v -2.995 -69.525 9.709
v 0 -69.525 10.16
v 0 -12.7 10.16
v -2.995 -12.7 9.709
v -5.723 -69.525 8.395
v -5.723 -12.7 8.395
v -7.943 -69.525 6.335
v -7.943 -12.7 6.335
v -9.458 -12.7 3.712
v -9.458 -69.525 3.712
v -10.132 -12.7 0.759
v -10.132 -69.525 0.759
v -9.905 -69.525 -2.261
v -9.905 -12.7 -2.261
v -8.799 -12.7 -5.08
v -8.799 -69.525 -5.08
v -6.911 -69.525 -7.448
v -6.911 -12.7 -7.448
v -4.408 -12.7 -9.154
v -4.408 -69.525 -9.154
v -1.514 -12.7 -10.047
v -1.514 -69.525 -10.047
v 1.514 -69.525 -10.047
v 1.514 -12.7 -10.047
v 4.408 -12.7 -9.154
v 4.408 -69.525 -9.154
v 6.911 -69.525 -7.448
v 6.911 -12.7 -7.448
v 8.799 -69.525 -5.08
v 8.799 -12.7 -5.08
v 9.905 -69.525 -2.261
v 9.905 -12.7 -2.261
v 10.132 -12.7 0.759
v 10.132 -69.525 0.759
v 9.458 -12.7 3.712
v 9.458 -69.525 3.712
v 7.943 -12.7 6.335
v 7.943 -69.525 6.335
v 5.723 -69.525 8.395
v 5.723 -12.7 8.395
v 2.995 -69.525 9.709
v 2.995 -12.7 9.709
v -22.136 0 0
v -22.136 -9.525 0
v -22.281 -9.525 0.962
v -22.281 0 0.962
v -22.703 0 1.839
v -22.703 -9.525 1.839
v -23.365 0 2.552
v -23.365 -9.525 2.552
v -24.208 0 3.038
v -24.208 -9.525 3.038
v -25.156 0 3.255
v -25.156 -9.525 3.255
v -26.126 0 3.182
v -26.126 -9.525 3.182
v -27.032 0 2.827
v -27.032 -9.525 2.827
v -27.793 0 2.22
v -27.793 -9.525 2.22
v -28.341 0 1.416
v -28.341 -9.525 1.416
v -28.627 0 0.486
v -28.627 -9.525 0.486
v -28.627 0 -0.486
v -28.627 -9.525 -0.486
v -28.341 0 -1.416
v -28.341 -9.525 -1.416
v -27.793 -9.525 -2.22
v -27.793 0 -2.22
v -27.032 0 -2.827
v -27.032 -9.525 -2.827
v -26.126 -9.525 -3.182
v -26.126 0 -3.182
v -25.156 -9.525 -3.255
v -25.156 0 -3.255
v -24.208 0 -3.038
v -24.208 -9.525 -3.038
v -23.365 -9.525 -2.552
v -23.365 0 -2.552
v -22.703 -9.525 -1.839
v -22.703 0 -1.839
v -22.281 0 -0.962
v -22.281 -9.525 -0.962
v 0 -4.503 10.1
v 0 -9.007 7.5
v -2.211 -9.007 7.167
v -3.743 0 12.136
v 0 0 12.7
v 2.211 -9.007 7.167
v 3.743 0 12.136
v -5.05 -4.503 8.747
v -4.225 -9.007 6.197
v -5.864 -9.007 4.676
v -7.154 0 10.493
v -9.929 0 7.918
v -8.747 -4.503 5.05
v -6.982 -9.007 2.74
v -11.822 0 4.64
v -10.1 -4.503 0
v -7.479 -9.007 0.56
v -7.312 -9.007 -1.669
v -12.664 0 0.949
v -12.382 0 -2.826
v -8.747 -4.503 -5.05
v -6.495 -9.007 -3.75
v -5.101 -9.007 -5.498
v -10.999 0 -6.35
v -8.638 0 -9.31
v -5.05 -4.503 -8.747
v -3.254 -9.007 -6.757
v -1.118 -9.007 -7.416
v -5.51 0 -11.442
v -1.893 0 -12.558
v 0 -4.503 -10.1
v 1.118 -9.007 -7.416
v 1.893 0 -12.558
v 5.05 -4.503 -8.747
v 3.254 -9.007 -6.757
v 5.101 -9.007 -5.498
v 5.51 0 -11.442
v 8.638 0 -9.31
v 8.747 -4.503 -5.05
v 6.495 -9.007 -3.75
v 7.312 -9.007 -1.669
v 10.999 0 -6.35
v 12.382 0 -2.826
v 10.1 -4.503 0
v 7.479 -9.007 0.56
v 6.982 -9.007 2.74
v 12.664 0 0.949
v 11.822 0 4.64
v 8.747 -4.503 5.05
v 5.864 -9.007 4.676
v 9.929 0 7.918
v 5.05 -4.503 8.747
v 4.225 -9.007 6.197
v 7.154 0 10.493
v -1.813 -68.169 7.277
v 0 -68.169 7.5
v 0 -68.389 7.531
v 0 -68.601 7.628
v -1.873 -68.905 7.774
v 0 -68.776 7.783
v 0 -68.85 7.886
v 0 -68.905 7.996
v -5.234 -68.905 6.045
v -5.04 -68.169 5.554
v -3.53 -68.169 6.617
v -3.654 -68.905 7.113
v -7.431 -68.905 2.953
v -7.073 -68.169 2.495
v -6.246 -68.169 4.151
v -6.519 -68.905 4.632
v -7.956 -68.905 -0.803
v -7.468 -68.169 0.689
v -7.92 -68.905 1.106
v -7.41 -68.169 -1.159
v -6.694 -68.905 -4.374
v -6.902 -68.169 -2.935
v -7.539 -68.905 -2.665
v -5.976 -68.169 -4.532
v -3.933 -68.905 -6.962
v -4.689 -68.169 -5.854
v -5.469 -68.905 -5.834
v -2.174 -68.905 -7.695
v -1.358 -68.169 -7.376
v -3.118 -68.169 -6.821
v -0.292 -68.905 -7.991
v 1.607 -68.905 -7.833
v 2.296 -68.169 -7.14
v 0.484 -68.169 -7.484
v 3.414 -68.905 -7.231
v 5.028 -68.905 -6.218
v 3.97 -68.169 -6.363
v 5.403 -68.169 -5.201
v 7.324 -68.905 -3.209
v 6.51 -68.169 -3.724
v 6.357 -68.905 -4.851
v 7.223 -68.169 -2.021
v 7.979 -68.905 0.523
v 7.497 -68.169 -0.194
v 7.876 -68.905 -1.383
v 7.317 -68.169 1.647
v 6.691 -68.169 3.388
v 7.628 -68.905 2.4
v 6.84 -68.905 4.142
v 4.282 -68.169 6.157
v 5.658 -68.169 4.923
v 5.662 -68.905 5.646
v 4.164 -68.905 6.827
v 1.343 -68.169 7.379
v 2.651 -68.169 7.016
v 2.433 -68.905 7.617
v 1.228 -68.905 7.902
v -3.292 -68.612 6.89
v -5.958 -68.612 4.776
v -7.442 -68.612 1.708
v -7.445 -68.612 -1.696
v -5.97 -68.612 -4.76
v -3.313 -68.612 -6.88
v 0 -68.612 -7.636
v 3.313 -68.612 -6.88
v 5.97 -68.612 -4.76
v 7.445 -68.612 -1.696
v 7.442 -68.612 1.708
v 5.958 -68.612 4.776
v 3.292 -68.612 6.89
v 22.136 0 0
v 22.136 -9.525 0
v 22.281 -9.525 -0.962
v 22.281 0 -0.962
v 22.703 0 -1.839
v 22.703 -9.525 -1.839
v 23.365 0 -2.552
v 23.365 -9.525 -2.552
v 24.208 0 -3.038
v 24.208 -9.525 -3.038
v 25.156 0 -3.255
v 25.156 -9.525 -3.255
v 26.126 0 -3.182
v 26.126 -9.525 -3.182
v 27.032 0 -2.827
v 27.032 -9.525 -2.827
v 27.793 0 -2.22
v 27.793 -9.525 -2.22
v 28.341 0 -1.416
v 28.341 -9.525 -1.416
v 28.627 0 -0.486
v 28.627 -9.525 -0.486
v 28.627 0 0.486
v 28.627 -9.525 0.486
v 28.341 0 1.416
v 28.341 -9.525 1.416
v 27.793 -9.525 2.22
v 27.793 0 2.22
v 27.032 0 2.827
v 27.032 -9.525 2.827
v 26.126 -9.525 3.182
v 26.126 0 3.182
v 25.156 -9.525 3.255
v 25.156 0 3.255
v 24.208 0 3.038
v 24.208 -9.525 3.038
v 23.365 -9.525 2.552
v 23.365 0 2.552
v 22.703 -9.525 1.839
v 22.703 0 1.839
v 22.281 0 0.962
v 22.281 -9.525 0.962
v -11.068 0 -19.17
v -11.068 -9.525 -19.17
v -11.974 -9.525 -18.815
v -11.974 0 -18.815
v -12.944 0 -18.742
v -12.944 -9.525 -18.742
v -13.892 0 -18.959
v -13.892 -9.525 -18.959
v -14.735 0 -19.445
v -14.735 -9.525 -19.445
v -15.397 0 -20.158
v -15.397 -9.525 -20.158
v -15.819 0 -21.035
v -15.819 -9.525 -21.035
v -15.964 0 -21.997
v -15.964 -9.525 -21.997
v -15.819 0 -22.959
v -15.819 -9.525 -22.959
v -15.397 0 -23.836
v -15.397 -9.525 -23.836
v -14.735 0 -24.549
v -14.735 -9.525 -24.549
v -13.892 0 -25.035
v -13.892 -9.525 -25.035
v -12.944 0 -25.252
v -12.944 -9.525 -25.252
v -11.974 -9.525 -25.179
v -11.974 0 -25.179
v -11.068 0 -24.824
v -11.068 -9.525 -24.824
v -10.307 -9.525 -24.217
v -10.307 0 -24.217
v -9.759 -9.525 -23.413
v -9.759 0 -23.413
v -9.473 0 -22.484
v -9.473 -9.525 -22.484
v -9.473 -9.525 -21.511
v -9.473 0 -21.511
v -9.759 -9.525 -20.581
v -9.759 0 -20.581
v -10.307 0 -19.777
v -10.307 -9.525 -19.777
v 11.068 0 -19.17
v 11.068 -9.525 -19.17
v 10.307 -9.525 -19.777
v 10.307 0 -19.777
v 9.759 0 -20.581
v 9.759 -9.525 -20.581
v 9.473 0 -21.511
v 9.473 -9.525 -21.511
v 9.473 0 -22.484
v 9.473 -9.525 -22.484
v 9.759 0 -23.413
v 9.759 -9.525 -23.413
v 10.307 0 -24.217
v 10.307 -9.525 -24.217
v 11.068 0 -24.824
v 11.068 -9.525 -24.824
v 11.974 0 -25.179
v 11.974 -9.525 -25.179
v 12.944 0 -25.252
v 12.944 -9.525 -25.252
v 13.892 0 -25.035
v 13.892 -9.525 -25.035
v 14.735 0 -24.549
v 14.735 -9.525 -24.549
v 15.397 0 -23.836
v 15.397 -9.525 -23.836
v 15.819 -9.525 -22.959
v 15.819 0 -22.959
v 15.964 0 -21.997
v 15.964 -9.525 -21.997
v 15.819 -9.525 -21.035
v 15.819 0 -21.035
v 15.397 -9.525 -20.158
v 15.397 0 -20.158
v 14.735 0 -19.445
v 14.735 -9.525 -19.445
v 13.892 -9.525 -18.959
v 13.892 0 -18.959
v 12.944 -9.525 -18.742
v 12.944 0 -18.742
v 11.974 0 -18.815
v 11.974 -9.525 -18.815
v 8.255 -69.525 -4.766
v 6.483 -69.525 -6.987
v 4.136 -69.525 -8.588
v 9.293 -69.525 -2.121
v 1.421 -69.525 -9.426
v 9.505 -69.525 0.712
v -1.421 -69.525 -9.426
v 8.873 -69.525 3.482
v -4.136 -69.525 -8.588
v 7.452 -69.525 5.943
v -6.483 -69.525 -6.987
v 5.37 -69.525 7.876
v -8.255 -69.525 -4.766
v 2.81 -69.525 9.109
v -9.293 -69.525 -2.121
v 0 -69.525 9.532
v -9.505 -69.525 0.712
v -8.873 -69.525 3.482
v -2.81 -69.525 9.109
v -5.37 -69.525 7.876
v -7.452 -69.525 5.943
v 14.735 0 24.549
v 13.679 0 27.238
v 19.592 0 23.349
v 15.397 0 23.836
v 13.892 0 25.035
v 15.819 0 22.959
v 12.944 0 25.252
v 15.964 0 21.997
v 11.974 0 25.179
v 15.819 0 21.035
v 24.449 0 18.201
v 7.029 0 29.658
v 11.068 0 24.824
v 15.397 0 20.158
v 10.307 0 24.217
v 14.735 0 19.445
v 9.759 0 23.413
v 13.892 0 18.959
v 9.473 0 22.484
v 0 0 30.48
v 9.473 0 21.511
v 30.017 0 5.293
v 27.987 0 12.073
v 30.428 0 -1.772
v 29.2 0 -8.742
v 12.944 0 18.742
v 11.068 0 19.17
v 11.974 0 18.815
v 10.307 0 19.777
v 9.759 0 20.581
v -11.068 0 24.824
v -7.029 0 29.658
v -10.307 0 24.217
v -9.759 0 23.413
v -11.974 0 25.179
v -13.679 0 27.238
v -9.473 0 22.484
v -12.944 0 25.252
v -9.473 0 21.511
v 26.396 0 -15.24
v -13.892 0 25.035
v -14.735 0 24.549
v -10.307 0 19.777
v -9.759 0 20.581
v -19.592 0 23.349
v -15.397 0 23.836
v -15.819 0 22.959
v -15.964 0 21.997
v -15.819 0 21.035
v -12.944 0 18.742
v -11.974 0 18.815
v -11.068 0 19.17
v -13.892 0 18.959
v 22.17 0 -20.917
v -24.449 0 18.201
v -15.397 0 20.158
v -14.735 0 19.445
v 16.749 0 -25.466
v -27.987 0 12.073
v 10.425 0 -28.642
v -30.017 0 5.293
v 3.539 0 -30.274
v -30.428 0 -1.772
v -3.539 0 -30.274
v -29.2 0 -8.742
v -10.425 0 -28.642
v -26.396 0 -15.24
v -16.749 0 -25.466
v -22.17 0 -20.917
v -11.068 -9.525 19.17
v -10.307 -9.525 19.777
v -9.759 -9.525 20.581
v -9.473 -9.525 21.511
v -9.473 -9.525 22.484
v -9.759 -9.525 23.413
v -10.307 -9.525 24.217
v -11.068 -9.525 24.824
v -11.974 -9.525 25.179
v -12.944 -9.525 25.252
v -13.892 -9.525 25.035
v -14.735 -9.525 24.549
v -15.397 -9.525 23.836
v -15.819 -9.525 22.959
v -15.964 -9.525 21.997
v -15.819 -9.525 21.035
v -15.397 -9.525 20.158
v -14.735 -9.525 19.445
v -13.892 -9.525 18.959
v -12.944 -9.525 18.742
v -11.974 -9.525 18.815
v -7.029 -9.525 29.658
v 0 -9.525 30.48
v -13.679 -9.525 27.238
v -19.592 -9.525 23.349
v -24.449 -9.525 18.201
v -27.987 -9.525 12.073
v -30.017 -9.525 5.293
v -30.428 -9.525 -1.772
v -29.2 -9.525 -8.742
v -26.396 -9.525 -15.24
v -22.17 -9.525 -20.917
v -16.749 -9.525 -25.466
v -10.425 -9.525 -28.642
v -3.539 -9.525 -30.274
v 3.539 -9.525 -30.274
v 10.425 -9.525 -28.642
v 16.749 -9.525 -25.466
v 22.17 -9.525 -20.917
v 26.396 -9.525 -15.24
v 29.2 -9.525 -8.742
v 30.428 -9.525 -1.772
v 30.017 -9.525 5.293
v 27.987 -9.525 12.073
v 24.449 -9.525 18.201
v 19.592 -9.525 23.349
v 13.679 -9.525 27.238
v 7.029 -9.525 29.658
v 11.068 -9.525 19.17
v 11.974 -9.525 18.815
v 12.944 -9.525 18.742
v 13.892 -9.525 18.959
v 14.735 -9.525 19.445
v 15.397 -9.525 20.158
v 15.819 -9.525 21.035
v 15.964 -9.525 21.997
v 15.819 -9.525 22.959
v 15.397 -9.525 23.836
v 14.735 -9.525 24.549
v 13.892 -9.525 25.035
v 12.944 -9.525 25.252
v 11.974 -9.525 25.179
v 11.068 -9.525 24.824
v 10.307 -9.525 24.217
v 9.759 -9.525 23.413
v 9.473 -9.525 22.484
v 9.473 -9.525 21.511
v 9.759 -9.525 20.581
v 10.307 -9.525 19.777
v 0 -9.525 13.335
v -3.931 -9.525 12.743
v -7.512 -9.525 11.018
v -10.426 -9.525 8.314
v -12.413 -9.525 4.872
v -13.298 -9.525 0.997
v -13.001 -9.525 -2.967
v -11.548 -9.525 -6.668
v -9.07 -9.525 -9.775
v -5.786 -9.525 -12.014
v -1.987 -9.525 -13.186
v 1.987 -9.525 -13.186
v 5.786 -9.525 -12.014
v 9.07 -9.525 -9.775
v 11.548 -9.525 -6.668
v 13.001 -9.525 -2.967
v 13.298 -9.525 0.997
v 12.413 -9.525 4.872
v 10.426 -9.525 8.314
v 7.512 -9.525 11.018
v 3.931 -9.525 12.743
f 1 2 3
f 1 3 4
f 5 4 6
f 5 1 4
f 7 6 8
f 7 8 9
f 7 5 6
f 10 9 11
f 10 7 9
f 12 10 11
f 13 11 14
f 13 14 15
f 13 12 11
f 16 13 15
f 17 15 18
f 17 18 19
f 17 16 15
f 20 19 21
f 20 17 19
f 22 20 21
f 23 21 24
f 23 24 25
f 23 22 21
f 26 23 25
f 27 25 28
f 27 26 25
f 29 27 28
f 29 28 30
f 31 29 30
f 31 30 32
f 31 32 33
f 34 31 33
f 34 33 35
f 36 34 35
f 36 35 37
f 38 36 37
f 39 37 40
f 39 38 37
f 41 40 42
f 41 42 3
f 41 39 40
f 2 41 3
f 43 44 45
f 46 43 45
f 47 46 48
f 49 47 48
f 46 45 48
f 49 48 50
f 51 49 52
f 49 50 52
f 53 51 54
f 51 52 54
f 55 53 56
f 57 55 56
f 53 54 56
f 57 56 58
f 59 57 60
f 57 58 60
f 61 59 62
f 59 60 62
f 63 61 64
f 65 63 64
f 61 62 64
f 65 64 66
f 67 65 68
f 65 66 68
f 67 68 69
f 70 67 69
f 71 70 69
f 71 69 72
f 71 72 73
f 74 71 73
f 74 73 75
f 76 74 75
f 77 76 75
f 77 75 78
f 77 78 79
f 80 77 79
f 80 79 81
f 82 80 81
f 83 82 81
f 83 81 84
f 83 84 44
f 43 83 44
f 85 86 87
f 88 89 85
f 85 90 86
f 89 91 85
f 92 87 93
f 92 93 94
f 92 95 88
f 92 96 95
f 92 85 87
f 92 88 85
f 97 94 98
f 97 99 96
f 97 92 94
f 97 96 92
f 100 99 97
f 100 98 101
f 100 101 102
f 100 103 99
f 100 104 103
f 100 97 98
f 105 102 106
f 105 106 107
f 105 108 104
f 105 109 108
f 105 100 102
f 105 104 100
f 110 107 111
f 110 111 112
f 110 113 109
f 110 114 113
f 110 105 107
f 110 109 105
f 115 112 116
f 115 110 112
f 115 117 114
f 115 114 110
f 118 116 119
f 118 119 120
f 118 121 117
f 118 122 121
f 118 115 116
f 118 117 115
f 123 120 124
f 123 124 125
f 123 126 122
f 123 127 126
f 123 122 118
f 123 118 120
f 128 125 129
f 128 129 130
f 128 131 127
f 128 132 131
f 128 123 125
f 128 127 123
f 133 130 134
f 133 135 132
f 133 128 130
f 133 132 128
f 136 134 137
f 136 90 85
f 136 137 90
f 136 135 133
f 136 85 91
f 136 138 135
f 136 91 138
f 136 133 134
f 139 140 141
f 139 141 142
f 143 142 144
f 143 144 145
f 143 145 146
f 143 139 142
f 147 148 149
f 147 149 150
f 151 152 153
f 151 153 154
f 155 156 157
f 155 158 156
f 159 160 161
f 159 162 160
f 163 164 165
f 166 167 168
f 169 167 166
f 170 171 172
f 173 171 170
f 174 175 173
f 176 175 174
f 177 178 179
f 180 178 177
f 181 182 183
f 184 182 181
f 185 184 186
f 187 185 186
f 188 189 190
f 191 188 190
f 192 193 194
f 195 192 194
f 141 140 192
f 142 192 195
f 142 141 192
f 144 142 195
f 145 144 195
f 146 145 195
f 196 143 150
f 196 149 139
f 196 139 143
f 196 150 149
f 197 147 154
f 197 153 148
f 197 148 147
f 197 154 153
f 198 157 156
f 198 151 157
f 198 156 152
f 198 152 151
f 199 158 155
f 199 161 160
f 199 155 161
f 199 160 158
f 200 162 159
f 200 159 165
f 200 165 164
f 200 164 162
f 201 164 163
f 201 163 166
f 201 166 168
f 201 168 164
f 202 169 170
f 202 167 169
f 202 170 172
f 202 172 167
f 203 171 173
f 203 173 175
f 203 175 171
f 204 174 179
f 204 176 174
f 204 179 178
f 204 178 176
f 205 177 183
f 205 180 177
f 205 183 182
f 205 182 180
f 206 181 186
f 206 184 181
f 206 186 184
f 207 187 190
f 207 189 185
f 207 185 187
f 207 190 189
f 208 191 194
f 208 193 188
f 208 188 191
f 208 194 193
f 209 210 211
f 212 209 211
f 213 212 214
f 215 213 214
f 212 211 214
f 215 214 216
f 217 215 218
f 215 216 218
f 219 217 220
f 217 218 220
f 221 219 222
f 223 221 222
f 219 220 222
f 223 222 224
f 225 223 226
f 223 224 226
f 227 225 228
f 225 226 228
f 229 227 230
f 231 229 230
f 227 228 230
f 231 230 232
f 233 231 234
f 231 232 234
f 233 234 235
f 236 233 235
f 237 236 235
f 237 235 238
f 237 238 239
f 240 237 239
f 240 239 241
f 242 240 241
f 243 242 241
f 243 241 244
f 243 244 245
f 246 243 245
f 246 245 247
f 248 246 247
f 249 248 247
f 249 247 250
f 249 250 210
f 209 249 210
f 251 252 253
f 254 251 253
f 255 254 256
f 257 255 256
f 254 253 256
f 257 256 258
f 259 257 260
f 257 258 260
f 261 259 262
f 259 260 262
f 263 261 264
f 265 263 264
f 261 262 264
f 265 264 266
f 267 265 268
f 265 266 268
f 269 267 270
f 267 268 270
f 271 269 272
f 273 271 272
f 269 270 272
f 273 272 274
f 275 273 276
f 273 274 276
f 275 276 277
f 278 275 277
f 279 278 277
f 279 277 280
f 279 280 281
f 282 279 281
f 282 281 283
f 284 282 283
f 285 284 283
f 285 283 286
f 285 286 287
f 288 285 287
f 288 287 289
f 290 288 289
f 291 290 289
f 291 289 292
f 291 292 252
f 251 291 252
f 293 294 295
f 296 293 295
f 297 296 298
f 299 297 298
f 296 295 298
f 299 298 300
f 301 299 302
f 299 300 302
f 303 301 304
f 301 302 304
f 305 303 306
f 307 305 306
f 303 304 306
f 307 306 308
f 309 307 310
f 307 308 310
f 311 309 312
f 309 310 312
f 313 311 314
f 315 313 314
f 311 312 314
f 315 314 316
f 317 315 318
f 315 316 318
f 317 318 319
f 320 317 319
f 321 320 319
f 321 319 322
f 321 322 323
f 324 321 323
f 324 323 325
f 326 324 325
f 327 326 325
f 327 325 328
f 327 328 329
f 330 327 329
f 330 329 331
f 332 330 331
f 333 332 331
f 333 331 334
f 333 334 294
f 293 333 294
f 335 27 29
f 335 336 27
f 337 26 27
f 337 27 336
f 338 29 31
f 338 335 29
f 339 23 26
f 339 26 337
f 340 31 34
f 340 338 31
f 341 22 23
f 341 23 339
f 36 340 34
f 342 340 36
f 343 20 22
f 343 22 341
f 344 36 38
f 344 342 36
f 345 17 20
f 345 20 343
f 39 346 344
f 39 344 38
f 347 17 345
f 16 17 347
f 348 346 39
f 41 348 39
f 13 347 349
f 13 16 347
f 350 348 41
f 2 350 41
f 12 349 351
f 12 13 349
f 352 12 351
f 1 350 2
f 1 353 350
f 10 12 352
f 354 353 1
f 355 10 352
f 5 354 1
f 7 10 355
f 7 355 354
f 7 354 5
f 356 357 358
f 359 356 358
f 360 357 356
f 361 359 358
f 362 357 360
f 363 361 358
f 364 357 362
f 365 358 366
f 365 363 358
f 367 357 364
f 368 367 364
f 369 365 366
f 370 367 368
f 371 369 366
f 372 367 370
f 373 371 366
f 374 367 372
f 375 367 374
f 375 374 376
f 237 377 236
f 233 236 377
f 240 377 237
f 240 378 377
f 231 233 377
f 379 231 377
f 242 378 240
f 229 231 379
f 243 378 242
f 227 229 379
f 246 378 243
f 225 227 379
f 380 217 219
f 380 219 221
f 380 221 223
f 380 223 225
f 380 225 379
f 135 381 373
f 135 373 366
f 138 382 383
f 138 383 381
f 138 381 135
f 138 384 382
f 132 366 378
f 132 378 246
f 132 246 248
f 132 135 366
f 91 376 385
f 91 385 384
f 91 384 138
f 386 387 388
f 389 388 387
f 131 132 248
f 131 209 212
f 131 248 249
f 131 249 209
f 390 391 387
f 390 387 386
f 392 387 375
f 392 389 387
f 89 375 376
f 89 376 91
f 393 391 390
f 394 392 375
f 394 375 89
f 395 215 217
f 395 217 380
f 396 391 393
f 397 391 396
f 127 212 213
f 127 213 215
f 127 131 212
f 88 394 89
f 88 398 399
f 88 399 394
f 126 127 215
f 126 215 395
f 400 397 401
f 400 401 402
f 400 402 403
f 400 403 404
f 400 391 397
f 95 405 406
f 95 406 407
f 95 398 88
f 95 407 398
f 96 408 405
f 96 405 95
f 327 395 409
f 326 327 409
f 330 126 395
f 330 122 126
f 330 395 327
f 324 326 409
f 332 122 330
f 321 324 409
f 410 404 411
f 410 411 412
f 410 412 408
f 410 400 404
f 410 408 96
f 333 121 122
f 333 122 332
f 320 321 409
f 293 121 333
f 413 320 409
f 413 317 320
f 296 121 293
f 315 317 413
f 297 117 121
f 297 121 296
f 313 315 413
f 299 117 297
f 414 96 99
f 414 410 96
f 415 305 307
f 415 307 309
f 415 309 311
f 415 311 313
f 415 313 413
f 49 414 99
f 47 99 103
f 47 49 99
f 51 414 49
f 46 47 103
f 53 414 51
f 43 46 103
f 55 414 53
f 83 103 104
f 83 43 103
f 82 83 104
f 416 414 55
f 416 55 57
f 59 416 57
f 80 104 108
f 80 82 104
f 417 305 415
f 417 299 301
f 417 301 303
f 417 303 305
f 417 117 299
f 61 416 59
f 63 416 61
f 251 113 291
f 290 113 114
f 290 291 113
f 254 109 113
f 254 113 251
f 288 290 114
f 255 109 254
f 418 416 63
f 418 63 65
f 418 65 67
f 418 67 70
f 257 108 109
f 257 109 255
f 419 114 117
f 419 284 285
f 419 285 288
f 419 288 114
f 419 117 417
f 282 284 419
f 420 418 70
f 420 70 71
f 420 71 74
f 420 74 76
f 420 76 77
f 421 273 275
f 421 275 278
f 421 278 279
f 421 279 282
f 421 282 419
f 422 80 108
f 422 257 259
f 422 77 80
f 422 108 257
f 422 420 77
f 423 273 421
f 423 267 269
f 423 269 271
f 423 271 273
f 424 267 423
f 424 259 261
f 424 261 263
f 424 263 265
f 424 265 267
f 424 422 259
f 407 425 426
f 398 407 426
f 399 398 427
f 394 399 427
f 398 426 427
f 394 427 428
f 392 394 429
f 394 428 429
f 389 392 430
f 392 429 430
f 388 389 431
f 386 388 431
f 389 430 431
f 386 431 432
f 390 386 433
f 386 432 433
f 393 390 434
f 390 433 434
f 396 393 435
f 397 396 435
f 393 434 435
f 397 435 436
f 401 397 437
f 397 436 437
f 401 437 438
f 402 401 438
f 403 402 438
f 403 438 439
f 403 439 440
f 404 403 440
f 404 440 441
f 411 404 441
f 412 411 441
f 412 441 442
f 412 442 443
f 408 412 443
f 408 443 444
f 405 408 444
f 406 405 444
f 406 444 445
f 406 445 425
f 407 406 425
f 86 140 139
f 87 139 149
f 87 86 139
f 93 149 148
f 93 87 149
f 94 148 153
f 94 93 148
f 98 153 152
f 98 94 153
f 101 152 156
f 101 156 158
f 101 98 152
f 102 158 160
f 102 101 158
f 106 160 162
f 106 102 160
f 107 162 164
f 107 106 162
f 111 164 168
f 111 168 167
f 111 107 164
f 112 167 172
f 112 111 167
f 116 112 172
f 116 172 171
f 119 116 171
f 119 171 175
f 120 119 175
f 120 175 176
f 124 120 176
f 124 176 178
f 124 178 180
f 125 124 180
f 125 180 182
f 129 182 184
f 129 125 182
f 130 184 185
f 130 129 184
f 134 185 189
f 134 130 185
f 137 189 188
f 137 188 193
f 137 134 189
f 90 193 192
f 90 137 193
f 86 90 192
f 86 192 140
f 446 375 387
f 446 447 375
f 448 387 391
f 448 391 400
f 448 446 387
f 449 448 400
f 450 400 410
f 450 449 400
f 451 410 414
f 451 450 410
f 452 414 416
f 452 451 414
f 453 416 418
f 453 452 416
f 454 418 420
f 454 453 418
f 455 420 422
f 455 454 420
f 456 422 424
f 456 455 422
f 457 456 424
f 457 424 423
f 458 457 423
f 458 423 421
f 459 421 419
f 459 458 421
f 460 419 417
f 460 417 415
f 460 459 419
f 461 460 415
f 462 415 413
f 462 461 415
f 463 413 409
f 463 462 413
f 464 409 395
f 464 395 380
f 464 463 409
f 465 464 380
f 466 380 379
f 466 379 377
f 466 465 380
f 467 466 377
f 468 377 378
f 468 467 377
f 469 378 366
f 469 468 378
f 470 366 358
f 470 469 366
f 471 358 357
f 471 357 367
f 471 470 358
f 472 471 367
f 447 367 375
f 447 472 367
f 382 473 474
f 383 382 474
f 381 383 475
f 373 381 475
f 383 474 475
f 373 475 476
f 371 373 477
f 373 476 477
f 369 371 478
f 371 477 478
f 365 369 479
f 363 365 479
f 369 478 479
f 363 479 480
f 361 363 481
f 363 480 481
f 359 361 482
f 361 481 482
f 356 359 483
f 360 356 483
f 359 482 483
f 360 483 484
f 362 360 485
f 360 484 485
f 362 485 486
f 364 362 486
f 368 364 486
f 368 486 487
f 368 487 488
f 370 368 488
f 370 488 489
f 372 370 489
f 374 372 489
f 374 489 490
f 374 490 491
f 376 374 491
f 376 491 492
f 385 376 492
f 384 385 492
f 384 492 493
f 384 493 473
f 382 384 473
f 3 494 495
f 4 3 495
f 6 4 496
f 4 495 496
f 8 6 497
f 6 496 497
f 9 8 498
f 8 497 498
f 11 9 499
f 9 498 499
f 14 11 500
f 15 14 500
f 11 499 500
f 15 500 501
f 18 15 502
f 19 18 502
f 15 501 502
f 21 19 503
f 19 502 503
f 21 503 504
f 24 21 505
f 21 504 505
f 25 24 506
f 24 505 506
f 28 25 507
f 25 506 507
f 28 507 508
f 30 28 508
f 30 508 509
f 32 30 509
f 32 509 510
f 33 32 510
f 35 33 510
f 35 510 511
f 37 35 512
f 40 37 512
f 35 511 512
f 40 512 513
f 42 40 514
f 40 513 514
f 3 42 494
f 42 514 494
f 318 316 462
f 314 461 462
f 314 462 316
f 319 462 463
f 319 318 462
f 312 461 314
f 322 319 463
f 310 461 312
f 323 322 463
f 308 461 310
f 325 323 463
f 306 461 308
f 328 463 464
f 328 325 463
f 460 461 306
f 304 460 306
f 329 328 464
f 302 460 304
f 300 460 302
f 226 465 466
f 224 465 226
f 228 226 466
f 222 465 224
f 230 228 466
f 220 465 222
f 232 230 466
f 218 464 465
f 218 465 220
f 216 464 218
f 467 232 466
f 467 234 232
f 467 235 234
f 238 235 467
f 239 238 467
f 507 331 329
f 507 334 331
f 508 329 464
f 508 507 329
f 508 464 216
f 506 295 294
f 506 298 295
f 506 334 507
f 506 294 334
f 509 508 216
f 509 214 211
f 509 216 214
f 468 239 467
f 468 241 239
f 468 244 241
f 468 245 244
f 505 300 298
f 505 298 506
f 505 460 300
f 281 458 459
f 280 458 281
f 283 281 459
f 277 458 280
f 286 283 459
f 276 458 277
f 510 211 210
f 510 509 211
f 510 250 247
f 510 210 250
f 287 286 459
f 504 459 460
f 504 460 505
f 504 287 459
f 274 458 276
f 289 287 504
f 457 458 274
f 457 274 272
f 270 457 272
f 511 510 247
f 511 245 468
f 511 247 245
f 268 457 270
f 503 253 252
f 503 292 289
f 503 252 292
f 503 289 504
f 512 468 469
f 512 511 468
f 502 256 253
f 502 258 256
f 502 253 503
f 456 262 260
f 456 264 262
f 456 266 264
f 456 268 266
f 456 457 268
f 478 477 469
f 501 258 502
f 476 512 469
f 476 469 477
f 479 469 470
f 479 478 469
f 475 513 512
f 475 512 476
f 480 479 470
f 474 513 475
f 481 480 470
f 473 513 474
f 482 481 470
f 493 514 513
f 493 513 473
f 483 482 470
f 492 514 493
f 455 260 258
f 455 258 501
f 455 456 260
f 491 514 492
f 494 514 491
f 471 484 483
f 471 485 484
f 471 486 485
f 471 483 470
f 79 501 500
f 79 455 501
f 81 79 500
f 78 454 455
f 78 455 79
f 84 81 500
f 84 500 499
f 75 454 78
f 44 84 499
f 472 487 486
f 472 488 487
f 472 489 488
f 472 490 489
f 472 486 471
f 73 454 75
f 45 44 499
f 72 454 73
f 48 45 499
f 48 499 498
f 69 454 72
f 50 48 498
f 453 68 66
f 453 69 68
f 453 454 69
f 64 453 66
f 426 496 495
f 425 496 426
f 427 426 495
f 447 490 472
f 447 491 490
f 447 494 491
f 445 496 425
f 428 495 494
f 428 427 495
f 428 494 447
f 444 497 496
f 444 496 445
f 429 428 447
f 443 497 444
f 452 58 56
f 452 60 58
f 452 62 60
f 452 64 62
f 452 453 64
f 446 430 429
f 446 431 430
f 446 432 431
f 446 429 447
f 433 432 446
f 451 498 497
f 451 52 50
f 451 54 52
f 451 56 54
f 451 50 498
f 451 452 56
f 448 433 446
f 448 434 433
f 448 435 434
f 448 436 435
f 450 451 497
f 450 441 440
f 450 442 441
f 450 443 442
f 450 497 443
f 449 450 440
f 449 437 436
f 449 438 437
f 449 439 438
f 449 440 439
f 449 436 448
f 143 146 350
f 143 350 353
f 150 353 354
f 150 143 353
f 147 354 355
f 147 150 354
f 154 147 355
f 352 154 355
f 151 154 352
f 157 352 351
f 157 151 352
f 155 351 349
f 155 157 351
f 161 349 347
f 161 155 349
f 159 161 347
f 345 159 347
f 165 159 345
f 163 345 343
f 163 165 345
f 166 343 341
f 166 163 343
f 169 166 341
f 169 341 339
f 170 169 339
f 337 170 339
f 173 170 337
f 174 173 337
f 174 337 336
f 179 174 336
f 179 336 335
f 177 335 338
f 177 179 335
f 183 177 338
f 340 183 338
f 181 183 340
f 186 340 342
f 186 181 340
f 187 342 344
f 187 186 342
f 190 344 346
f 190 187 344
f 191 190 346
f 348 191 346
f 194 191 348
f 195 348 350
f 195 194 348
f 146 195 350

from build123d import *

# Parameters (mm, degrees)
F_1_4_CLEARANCE_HOLE1_D = 6.5278
CIRPATTERN1_COUNT       = 6
CHAMFER1_SIZE           = 2.032
CHAMFER1_SIZE2          = 0.820981291
FILLET1_R               = 0.79375
CHAMFER2_SIZE           = 3.175


with BuildPart() as part:
    # Sketch1 → Revolve1 (revolve)
    with BuildSketch(Plane.XY, mode=Mode.PRIVATE) as revolve1_sk:
        Polygon((7.5, -69.525), (7.5, -9.006664199), (12.7, 0), (30.48, 0), (30.48, -9.525), (10.16, -9.525), (10.16, -69.525), align=None)
    revolve(revolve1_sk.sketch.rotate(Axis((0, 0, 0), (0, -1, 0)), 90), axis=Axis((0, 0, 0), (0, -1, 0)))

    # 1/4 Clearance Hole1 (through all)
    with Locations(Plane(origin=(0, 0, 0), x_dir=(1, 0, 0), z_dir=(0, 1, 0))):
        with Locations((25.4, 0)):
            f_1_4_clearance_hole1 = Hole(F_1_4_CLEARANCE_HOLE1_D / 2)

    # CirPattern1: 1/4 Clearance Hole1 ×6 about axis
    cirpattern1_axis = Axis((0, 0, 0), (0, 1, 0))
    for i in range(1, CIRPATTERN1_COUNT):
        add(f_1_4_clearance_hole1.rotate(cirpattern1_axis, i * 360 / CIRPATTERN1_COUNT), mode=Mode.SUBTRACT)

    # Chamfer1
    chamfer1_edges = [part.edges().sort_by_distance(p)[0] for p in [
        (0, -69.525, -7.5),
    ]]
    chamfer1_side = [part.faces().sort_by_distance(p)[0] for p in [
        (0, -69.525, -9.872631804),
    ]]
    chamfer(chamfer1_edges, length=CHAMFER1_SIZE, length2=CHAMFER1_SIZE2, reference=chamfer1_side[0])

    # Fillet1
    fillet1_edges = [part.edges().sort_by_distance(p)[0] for p in [
        (0, -68.704018709, -7.5),
    ]]
    fillet(fillet1_edges, radius=FILLET1_R)

    # Chamfer2
    chamfer2_edges = [part.edges().sort_by_distance(p)[0] for p in [
        (0, -9.525, -10.16),
    ]]
    chamfer(chamfer2_edges, length=CHAMFER2_SIZE)


solid = part.part
